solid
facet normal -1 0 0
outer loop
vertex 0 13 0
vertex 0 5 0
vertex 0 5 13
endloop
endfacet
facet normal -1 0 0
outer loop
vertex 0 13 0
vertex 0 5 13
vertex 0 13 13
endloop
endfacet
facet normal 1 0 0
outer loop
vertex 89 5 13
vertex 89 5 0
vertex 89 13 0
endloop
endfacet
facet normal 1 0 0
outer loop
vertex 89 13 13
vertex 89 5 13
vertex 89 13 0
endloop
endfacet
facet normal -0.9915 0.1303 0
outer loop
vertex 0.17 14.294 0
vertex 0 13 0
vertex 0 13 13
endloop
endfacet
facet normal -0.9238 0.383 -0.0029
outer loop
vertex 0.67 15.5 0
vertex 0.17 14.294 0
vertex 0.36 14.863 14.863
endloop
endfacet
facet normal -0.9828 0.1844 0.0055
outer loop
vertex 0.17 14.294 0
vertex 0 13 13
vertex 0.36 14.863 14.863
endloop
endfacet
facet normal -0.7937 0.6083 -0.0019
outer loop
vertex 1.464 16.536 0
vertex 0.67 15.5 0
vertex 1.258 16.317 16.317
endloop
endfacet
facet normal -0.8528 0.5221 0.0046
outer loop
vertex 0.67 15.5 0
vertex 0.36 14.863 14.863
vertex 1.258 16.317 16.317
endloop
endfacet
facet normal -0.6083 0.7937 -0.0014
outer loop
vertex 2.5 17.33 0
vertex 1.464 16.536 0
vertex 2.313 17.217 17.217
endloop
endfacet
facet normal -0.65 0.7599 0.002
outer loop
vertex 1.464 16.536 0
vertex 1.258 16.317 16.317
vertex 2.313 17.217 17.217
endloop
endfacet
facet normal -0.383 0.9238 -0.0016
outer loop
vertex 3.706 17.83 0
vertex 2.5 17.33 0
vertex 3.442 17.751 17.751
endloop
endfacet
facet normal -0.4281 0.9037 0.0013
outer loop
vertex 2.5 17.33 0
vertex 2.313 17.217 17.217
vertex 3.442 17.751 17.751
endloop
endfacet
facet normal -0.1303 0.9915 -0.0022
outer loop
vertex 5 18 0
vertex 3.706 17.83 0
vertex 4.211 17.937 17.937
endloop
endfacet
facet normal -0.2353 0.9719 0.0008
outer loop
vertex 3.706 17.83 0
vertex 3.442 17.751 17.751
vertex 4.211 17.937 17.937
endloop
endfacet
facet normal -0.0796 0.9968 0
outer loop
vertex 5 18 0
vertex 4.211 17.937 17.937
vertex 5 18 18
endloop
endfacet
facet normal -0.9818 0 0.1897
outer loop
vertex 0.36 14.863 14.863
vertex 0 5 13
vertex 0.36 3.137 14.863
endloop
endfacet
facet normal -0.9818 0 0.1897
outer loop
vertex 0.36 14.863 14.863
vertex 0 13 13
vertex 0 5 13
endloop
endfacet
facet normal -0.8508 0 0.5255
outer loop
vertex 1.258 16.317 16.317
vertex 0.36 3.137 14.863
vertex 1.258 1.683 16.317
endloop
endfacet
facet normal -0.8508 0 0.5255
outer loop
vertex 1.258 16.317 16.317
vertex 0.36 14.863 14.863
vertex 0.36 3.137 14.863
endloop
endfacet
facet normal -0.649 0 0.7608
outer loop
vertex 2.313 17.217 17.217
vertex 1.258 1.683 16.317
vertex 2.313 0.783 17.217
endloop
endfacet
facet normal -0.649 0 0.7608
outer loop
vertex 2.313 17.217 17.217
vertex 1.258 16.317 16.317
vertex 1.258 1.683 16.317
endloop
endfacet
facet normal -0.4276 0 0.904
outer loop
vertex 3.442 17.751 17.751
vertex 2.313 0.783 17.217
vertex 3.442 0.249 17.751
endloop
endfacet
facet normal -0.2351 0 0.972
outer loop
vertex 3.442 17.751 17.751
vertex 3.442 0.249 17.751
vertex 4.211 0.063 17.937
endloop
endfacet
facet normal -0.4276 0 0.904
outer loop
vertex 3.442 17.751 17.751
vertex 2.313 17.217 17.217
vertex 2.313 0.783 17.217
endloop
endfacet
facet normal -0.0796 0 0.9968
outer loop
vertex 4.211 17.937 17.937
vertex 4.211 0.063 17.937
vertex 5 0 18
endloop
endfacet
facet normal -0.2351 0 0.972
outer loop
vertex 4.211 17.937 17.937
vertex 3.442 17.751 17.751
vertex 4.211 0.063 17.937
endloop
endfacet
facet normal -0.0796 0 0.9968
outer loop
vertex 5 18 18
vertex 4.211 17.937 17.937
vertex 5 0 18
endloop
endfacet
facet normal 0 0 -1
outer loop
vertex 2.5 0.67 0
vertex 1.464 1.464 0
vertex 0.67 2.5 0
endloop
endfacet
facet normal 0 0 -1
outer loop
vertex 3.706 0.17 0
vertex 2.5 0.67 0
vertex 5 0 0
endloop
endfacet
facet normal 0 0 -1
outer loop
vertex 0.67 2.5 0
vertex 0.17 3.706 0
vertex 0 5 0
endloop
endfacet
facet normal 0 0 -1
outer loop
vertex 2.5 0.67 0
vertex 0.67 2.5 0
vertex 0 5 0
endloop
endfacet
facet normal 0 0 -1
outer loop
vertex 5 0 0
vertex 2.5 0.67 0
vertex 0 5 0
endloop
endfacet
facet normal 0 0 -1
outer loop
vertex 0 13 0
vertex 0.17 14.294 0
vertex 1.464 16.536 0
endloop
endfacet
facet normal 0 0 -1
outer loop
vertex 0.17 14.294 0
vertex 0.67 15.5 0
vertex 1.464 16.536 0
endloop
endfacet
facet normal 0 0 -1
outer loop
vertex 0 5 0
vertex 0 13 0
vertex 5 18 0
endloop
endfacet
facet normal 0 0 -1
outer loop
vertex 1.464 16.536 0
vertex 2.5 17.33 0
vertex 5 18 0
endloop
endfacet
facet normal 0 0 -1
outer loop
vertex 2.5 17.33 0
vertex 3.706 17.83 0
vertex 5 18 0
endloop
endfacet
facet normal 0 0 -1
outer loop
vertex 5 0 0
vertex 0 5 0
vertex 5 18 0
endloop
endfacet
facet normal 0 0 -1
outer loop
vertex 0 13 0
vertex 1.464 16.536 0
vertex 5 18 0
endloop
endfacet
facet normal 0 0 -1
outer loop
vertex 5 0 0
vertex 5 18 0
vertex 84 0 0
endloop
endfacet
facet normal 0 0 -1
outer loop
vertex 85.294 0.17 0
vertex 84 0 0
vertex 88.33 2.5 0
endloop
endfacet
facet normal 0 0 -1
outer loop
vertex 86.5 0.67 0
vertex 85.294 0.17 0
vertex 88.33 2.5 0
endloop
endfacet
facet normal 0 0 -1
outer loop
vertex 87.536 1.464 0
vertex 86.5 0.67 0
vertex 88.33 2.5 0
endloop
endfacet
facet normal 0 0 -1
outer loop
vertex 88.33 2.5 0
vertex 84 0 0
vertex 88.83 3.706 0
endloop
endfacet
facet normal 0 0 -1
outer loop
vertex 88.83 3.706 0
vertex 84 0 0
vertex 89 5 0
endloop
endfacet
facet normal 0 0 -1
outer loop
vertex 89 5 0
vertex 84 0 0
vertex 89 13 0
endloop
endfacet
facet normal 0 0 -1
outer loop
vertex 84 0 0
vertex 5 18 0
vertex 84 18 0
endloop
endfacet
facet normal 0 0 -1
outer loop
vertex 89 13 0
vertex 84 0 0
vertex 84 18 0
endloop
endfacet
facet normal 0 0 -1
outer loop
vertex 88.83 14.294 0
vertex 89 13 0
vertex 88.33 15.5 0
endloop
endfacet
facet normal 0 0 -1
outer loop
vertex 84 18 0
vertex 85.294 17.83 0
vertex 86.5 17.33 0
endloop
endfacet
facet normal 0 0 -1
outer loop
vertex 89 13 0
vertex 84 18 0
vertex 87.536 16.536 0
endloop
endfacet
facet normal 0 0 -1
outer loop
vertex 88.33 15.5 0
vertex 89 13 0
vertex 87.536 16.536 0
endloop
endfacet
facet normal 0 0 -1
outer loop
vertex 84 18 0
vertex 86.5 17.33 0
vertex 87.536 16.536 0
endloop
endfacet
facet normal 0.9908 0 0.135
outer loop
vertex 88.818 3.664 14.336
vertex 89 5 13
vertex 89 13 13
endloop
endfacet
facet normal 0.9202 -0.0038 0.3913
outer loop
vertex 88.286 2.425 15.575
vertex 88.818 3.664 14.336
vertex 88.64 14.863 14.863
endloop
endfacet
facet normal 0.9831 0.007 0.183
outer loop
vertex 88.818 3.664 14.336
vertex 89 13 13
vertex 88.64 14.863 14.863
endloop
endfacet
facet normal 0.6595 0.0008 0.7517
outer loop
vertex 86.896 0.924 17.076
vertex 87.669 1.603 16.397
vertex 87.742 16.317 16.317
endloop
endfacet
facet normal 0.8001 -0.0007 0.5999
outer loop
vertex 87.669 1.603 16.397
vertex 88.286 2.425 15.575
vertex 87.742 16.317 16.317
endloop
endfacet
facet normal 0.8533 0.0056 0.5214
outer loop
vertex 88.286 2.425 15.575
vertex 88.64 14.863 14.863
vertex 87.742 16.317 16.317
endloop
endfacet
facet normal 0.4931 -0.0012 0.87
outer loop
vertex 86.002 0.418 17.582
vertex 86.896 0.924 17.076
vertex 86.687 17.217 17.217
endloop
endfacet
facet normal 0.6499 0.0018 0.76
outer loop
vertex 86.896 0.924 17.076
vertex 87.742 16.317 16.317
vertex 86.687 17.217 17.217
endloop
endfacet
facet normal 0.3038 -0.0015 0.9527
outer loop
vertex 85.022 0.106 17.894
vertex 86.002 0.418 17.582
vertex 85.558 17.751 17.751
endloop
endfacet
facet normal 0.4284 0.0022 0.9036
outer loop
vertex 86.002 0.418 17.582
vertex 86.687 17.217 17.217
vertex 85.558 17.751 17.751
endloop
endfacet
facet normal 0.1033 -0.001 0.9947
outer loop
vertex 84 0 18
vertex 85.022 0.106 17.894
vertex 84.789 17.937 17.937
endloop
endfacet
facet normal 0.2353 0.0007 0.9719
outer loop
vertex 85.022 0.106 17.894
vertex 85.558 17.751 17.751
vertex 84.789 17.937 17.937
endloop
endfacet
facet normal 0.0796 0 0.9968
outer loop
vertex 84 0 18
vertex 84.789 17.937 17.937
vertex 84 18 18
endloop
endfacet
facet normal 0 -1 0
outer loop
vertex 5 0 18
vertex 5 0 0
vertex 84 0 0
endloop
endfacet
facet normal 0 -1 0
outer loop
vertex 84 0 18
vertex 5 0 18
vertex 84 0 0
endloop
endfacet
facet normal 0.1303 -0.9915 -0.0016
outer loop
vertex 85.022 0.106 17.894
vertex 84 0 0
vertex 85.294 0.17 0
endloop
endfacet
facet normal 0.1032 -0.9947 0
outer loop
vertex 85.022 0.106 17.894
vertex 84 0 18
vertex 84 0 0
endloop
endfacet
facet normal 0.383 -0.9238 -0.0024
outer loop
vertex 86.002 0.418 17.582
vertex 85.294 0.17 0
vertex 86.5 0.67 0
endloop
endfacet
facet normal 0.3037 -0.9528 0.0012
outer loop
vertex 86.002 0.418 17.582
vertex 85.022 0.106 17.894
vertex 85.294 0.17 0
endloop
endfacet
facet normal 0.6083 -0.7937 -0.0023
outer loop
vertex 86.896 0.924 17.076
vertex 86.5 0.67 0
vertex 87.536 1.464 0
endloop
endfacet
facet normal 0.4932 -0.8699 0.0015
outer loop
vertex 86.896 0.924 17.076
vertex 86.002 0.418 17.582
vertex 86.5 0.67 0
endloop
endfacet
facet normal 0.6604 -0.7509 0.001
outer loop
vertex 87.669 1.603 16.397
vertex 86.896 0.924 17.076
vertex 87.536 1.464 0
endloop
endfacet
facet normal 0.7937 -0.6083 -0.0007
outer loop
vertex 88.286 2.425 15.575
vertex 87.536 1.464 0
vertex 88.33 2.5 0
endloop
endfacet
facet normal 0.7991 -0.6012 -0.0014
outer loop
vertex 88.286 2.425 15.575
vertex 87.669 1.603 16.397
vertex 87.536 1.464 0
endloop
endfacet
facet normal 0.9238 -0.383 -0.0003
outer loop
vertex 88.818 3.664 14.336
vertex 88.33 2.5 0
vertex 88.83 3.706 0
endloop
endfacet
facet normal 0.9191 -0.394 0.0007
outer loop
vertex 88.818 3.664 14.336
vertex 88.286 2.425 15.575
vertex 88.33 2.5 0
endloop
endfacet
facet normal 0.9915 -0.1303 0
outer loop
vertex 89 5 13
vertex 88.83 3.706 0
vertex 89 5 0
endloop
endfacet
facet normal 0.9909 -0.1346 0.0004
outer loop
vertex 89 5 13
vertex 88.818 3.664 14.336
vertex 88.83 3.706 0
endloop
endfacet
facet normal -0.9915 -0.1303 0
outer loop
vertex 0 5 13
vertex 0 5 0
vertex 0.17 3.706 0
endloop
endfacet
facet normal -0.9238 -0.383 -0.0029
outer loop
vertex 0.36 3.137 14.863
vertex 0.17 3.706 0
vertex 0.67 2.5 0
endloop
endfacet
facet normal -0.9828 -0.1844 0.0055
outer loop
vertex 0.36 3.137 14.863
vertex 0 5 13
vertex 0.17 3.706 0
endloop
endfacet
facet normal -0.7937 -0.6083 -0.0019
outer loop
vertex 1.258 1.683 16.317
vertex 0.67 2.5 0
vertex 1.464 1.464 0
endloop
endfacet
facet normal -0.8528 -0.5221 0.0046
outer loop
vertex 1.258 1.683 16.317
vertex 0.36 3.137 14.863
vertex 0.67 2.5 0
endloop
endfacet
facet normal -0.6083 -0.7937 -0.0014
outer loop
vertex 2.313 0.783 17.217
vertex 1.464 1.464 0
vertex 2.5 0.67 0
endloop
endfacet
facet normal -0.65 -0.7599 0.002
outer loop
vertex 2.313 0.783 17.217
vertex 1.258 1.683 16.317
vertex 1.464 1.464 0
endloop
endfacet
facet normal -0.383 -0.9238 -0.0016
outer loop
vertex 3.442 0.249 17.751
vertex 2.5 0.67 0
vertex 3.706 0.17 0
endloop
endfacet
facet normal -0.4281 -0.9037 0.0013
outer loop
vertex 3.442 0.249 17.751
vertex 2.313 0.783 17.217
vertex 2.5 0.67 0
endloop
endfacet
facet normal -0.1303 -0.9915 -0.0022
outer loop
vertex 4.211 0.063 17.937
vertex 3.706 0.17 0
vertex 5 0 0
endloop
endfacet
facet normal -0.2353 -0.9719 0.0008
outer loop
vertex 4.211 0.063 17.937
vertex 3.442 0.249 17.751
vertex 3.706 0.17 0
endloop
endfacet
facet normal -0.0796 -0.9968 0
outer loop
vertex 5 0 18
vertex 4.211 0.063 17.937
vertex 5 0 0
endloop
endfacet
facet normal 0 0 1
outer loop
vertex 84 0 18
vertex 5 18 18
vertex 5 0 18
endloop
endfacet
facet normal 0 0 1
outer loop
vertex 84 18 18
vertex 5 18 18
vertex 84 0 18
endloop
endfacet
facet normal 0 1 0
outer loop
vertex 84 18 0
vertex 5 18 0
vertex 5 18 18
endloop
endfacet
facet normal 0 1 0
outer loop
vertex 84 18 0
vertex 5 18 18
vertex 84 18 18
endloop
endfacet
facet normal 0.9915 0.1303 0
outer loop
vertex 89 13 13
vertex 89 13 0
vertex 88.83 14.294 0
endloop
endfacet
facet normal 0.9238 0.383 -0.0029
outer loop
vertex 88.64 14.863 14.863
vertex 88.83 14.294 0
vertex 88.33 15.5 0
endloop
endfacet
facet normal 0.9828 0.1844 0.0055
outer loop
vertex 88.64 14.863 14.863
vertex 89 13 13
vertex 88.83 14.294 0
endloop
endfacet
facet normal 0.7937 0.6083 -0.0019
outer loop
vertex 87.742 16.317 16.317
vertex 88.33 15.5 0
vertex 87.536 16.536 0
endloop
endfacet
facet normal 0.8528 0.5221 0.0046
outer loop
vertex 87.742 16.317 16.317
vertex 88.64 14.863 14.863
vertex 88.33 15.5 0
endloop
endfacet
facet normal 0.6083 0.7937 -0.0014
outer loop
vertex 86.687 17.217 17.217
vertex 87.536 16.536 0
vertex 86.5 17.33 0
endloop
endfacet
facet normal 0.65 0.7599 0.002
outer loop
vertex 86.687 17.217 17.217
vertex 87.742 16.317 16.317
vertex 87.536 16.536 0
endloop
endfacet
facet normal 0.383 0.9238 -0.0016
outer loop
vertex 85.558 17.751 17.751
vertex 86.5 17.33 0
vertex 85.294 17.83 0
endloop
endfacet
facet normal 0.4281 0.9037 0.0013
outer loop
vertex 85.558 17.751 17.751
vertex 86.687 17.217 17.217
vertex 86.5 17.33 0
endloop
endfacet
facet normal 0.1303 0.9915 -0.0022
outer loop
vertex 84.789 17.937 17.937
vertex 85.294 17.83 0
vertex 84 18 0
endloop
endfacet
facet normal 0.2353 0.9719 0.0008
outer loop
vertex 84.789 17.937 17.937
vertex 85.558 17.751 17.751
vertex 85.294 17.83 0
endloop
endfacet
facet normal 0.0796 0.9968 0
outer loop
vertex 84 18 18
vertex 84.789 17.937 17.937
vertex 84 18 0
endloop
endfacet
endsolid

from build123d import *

# Parameters (mm, degrees)
F0_W     = 89
F0_H     = 18
F1_DEPTH = 18
F2_R     = 5


with BuildPart() as f1:
    # F0 (on Top) → F1 (new body)
    with BuildSketch(Plane.XY):
        with Locations((44.5, 9)):
            Rectangle(F0_W, F0_H)
    extrude(amount=F1_DEPTH)

    # F2
    f2_edges = [f1.edges().sort_by_distance(p)[0] for p in [
        (0, 0, 9),
        (89, 0, 9),
        (89, 18, 9),
        (0, 18, 9),
        (0, 9, 18),
        (89, 9, 18),
    ]]
    fillet(f2_edges, radius=F2_R)


solid = f1.part
